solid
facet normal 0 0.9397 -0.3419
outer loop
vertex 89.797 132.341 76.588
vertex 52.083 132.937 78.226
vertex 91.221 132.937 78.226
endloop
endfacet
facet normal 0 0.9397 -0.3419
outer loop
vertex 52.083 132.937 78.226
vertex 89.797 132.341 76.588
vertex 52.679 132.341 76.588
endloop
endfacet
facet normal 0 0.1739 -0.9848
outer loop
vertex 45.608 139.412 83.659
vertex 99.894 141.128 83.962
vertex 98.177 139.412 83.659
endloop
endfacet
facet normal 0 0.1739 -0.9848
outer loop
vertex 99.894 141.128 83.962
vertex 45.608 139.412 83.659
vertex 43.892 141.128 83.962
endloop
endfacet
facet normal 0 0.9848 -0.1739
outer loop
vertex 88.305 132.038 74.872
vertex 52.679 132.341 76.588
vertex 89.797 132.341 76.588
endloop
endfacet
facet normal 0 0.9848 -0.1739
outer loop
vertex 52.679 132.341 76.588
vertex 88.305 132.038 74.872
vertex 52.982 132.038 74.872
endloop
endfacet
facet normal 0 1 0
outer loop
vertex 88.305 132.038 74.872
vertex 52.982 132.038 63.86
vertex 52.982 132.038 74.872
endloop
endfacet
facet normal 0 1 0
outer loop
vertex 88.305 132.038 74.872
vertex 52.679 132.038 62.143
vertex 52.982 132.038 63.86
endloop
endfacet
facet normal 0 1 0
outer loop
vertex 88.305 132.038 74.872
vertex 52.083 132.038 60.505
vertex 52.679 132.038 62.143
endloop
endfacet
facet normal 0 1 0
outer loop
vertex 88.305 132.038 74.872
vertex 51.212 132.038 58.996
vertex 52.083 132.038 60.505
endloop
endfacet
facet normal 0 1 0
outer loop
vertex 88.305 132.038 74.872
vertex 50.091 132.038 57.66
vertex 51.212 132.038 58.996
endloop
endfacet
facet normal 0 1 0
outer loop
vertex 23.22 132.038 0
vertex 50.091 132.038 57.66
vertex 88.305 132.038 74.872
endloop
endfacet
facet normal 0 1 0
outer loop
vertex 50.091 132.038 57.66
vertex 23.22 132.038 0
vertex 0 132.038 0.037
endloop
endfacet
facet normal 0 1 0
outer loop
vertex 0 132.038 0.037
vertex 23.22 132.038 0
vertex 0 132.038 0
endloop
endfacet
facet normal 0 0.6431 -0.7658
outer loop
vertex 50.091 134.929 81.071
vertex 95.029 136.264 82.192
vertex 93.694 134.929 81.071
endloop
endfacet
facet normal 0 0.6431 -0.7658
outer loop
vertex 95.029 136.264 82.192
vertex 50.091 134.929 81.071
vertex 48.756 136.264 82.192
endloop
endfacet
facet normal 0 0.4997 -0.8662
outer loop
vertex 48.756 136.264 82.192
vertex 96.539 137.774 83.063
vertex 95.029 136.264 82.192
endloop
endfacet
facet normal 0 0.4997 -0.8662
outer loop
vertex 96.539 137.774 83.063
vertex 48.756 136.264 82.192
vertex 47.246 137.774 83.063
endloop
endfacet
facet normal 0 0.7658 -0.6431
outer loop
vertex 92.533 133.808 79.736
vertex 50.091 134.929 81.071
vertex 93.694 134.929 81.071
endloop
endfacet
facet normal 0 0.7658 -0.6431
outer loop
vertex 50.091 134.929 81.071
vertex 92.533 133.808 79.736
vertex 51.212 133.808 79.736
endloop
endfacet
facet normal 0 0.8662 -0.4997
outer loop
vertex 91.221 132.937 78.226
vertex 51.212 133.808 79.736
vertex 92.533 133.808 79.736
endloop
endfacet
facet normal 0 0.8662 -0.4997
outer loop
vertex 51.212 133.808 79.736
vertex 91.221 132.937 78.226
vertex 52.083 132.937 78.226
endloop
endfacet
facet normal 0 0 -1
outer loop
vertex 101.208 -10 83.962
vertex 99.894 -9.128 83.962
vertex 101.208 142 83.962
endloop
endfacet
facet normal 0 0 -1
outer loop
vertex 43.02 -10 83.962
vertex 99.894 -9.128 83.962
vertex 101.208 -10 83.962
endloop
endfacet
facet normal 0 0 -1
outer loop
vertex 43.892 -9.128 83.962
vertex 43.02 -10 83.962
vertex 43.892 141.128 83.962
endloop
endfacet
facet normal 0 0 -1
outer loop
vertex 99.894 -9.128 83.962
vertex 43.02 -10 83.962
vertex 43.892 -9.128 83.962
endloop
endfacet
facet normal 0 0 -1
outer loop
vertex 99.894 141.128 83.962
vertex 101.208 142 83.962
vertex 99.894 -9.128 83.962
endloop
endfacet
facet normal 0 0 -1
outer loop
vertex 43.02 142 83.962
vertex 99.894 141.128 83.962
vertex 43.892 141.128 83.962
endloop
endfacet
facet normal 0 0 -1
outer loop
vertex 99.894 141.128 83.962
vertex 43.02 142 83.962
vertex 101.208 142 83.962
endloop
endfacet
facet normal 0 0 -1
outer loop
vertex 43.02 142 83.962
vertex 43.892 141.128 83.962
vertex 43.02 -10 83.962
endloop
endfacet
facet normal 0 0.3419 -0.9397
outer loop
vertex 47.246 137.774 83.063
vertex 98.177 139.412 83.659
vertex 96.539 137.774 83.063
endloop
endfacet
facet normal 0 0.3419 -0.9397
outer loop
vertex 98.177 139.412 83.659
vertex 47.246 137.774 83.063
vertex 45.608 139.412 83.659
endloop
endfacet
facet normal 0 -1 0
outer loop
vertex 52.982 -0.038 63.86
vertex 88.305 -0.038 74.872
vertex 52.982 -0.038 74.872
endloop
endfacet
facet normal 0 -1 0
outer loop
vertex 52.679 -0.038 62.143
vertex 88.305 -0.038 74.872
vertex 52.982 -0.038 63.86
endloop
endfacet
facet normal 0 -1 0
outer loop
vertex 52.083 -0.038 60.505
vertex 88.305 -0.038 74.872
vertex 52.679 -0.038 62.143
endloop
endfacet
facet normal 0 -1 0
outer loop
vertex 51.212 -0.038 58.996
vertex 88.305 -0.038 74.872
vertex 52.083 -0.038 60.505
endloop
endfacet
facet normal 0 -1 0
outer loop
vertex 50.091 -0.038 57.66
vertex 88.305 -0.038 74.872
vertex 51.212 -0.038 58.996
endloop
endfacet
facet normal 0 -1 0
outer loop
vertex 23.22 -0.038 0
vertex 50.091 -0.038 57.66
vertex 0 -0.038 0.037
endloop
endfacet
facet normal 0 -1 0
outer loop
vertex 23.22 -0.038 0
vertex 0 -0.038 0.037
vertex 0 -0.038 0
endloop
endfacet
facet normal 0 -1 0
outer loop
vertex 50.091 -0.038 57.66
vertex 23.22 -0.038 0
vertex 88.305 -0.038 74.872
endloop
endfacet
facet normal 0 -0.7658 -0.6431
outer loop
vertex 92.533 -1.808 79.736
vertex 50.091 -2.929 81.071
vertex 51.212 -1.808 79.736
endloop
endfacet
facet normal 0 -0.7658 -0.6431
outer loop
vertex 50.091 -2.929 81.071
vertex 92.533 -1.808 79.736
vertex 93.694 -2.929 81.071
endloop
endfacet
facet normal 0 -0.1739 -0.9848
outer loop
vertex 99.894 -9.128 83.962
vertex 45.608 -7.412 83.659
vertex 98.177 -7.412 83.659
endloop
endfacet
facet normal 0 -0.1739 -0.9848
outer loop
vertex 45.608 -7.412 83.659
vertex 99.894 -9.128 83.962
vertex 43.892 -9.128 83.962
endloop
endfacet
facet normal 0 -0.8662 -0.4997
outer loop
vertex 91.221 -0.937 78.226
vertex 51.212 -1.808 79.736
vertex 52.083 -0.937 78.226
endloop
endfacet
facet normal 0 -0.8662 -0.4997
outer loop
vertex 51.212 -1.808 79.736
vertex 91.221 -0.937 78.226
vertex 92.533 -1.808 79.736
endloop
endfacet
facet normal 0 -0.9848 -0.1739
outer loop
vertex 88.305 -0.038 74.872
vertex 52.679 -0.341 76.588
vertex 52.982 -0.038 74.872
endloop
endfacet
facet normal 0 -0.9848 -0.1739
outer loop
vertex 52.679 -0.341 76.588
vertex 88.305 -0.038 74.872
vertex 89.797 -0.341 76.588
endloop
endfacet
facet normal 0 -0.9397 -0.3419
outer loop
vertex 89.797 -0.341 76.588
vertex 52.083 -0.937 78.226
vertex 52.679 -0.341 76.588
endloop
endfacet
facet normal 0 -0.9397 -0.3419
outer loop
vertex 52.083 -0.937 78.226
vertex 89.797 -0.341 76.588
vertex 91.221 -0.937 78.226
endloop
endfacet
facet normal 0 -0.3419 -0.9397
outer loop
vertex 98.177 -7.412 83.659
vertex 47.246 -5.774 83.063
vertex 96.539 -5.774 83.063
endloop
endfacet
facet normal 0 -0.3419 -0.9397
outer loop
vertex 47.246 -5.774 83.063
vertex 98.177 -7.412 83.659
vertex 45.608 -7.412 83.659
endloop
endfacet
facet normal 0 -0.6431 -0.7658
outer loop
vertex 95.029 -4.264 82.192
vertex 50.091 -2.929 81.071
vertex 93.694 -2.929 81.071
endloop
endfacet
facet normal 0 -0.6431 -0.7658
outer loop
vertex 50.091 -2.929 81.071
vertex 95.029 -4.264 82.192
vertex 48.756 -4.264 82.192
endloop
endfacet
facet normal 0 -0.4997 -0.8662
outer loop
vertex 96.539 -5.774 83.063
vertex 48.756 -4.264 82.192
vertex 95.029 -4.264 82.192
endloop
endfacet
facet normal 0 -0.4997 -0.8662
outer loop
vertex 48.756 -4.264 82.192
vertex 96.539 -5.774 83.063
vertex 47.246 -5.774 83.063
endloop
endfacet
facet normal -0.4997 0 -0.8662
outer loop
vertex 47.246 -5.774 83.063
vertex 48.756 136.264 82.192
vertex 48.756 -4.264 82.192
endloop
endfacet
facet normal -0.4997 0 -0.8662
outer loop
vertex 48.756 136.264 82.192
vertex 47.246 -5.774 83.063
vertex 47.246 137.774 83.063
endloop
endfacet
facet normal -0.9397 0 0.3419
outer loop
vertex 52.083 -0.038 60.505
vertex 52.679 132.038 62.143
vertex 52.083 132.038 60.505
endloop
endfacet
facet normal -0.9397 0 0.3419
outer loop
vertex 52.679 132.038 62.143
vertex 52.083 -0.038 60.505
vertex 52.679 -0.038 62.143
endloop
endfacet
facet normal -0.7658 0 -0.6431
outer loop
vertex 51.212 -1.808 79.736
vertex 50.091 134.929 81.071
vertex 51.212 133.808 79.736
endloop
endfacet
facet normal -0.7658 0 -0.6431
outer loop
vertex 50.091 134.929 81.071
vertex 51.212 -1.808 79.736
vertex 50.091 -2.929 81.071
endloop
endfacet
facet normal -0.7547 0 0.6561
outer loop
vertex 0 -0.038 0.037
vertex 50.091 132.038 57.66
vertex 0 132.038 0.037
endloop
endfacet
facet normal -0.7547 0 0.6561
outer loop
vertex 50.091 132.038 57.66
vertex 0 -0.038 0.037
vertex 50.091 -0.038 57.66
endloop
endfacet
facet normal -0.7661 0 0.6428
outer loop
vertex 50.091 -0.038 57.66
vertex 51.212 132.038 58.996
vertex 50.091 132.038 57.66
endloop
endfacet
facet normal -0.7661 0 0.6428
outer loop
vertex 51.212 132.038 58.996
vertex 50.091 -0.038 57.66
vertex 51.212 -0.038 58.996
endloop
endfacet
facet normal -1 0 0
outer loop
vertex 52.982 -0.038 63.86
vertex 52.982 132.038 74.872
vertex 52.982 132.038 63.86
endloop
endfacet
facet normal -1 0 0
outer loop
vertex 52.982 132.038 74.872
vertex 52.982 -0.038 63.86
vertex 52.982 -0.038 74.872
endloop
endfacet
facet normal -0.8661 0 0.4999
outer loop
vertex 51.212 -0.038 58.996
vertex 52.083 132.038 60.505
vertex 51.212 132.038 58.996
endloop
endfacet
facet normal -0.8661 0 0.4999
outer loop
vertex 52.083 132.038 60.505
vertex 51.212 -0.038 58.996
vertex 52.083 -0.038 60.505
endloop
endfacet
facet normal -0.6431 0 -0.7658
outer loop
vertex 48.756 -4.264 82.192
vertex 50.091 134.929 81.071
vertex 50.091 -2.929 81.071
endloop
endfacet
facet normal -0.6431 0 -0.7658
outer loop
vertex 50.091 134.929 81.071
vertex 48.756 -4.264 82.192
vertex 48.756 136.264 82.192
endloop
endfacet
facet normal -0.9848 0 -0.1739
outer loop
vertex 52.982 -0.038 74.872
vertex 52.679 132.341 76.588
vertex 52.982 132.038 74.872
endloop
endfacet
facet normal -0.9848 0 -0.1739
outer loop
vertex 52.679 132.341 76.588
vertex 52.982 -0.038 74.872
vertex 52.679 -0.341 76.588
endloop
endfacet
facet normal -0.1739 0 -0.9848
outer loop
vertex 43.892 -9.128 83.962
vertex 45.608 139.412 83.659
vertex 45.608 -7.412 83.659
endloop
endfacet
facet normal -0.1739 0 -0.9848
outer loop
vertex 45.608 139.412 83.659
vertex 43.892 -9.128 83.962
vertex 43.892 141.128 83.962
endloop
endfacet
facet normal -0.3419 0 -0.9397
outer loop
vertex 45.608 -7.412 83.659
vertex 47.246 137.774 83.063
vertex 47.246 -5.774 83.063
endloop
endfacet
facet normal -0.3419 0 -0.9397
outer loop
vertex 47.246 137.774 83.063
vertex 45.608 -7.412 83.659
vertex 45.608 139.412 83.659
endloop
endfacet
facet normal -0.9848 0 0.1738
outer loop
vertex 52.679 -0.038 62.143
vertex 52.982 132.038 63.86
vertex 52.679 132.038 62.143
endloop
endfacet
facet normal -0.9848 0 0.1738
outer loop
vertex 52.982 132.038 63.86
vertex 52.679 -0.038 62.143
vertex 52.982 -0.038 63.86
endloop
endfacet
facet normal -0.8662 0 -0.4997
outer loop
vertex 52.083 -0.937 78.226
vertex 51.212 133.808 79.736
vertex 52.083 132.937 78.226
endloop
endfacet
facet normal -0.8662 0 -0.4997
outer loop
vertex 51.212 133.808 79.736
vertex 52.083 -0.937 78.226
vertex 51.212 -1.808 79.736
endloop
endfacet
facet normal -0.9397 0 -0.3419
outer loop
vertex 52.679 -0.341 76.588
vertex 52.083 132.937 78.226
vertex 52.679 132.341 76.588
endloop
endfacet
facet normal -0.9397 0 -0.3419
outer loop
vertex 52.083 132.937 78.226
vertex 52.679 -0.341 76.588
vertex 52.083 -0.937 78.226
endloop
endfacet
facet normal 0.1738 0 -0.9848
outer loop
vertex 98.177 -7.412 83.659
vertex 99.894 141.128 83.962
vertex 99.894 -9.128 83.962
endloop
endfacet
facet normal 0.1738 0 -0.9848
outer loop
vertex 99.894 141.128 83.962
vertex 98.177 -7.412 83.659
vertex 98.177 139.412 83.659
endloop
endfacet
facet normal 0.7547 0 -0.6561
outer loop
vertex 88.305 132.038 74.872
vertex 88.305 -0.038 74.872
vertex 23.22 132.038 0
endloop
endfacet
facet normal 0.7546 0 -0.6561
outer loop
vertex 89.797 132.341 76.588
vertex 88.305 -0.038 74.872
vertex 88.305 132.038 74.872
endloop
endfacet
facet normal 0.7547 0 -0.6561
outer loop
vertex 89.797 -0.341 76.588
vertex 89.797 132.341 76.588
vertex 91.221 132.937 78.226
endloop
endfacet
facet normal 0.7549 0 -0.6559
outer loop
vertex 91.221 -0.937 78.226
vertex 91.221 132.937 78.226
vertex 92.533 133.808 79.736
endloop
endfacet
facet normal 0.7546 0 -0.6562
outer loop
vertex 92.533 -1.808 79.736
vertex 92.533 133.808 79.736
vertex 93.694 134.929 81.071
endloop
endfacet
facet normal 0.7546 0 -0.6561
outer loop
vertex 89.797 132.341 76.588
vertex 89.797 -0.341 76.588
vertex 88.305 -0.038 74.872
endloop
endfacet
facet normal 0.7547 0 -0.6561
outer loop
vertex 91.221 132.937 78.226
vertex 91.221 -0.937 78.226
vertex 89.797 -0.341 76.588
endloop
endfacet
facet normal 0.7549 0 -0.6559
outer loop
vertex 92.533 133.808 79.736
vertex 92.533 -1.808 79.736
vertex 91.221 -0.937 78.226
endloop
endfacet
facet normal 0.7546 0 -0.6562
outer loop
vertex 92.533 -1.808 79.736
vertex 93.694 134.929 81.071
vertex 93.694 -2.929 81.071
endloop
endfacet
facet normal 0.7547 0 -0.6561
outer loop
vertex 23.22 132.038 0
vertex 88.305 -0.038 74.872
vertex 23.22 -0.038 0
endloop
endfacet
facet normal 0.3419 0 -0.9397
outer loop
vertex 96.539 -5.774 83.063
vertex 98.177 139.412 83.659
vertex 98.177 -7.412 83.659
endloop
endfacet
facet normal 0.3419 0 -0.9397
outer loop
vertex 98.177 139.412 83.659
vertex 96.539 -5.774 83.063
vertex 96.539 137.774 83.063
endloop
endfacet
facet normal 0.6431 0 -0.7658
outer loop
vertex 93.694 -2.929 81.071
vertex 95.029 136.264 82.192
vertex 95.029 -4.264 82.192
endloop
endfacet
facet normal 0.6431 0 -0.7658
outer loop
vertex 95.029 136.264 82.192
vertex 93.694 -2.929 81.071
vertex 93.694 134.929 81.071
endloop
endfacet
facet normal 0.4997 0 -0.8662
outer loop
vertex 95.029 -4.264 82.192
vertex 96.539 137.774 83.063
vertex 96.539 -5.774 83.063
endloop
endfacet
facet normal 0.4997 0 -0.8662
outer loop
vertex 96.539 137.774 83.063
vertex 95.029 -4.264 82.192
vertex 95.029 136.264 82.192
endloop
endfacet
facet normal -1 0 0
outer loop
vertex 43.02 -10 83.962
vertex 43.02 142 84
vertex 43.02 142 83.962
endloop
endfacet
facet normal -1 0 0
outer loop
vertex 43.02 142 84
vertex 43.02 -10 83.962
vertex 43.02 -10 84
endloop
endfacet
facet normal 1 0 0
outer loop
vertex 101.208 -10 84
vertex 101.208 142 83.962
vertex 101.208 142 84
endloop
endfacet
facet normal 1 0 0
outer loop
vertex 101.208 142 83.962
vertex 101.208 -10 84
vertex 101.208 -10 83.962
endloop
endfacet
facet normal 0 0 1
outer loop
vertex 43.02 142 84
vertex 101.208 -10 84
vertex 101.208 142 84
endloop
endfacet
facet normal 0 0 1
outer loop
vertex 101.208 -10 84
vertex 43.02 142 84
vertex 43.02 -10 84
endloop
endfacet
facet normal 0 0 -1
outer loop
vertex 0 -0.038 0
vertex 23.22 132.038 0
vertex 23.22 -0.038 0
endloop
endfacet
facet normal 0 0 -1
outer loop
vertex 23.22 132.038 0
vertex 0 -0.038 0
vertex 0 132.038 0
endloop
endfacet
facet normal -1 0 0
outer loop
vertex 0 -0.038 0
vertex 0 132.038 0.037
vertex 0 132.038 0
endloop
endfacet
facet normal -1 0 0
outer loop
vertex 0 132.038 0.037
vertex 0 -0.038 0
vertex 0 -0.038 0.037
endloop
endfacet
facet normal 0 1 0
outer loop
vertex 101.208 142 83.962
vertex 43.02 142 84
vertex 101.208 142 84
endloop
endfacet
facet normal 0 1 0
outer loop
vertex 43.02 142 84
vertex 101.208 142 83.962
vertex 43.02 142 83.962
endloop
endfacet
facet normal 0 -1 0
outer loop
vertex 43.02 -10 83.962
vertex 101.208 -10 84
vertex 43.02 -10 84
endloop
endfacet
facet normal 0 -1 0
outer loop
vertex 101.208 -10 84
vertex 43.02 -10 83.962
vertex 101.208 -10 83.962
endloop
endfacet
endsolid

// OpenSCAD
$fn = 36;

MAT_D = 1.16666666667;
// MAT_ANGLED_D = MAT_D / cos(MAT_ANGLE);
MAT_CNT = 15; // 7; 6 + some wiggle room

slotW = MAT_D * MAT_CNT; // Pre-rotation slot width
slotA = 49; // 49
slotD = 128 + 4;
slotH = 84;
slotClipW = 20;// MAT_D * 5;
smoothR = 10;

roundedSlot(slotW, slotD, slotH, slotA, smoothR, slotClipW);

function roundedSlotW(slotW, slotH, slotA) = slotH / tan(slotA) + slotW / cos(90 - slotA);

module roundedSlot(slotW, slotD, slotH, slotA, smoothR, slotClipW = 0) {
  totalW = roundedSlotW(slotW, slotH, slotA);
  angledExtra = smoothR / cos(90 - slotA);

  clipH = slotClipW * tan(slotA);
  clipZ = slotH - clipH;
  slotTopX = slotH / tan(slotA);
  clipX = slotTopX - slotClipW;

  Z = .0001; // A bit more than zero.

  difference() {
    translate([- Z, -smoothR - Z, 0])
    cube([Z + totalW + smoothR/2, slotD + smoothR * 2 + Z * 2, slotH]);

    union() {
      minkowski() {
        difference() {
          translate([-totalW / 2, -slotD / 2, -slotH - smoothR])
          cube([totalW * 2, slotD * 2, slotH * 2]);

          union() {
            color("green", 0.25)
            difference() {
              translate([-angledExtra, -smoothR, 0])
              rotate([0, 90 - slotA, 0])
              translate([0, 0, -slotH*250])
              cube([slotW + smoothR * 2, slotD + smoothR * 2, slotH * 1000]);

              union() {
                translate([-slotD * 2, -slotD * 2, -slotD * 2-smoothR])
                cube([slotD * 4, slotD * 4, slotD * 2]);
                translate([-slotD * 2, -slotD * 2, slotH])
                cube([slotD * 4, slotD * 4, slotD * 2]);
              };
            };

            color("red", 0.25)
            translate([clipX - smoothR, -smoothR, clipZ - smoothR])
            cube([slotClipW + Z + smoothR, slotD + smoothR * 2, clipH * 2 ]);
          };
        };

        sphere(smoothR);
      };

      // The top cut-off
      cutOffX = min(clipX - smoothR, slotTopX - (smoothR + smoothR / sin(90 - slotA)) / tan(slotA));
      translate([-1, -slotD, slotH - 1])
      cube([cutOffX + 1, slotD * 3, 8]);
    };
  };
}

// All sides, edges, and corners are rounded.
module fullyRoundedCube(w, d, h, r) {
  minkowski() {
    translate([r, r, r])
    cube([w - r * 2, d - r * 2, h - r * 2]);

    sphere(r);
  };
}

// Top and bottom are flat.
module sideRoundedCube(w, d, h, r) {
  minkowski() {
    translate([r, r, r / 2])
    cube([w - r * 2, d - r * 2, h - r]);

    cylinder(h = r, r = r, center = true);
  };
}

// Top is flat.
module bowlCube(w, d, h, r) {
  minkowski() {
    translate([r, r, r])
    cube([w - r * 2, d - r * 2, h - r]);

    difference() {
      sphere(r);

      translate([-r*2, -r*2, 0])
      cube([r*4, r*4, r*2]);
    };
  };
}

// non-centered sphere.
module ball (r) {
  translate([r, r, r])
  sphere(r);
}

module square_ring (w, d, r) {
  Z = .0001; // ~zero

  translate([r, r, r])
  minkowski() {
    difference() {
      cube([w - r * 2, d - r * 2, Z]);
      translate([Z, Z, 0])
      cube([w - r * 2 - Z * 2, d - r * 2 - Z * 2, Z]);
    };

    sphere(r);
  };
}

// non-centered sphere.
module ball (r) {
  translate([r, r, r])
  sphere(r);
}

module square_ring (w, d, r) {
  // Corners
  translate([0, 0, 0]) ball(r);
  translate([w-r*2, 0, 0]) ball(r);
  translate([0, d-r*2, 0]) ball(r);
  translate([w-r*2, d-r*2, 0]) ball(r);

  // Edges
  ew = w-r*2;
  ed = d-r*2;
  translate([0, 0, r]) {
    translate([r, r, 0])
    rotate([-90, 0, 0])
    cylinder(ed, r, r);
    translate([w-r, r, 0])
    rotate([-90, 0, 0])
    cylinder(ed, r, r);
    translate([r, r, 0])
    rotate([0, 90, 0])
    cylinder(ew, r, r);
    translate([r, d-r, 0])
    rotate([0, 90, 0])
    cylinder(ew, r, r);
  };
}
